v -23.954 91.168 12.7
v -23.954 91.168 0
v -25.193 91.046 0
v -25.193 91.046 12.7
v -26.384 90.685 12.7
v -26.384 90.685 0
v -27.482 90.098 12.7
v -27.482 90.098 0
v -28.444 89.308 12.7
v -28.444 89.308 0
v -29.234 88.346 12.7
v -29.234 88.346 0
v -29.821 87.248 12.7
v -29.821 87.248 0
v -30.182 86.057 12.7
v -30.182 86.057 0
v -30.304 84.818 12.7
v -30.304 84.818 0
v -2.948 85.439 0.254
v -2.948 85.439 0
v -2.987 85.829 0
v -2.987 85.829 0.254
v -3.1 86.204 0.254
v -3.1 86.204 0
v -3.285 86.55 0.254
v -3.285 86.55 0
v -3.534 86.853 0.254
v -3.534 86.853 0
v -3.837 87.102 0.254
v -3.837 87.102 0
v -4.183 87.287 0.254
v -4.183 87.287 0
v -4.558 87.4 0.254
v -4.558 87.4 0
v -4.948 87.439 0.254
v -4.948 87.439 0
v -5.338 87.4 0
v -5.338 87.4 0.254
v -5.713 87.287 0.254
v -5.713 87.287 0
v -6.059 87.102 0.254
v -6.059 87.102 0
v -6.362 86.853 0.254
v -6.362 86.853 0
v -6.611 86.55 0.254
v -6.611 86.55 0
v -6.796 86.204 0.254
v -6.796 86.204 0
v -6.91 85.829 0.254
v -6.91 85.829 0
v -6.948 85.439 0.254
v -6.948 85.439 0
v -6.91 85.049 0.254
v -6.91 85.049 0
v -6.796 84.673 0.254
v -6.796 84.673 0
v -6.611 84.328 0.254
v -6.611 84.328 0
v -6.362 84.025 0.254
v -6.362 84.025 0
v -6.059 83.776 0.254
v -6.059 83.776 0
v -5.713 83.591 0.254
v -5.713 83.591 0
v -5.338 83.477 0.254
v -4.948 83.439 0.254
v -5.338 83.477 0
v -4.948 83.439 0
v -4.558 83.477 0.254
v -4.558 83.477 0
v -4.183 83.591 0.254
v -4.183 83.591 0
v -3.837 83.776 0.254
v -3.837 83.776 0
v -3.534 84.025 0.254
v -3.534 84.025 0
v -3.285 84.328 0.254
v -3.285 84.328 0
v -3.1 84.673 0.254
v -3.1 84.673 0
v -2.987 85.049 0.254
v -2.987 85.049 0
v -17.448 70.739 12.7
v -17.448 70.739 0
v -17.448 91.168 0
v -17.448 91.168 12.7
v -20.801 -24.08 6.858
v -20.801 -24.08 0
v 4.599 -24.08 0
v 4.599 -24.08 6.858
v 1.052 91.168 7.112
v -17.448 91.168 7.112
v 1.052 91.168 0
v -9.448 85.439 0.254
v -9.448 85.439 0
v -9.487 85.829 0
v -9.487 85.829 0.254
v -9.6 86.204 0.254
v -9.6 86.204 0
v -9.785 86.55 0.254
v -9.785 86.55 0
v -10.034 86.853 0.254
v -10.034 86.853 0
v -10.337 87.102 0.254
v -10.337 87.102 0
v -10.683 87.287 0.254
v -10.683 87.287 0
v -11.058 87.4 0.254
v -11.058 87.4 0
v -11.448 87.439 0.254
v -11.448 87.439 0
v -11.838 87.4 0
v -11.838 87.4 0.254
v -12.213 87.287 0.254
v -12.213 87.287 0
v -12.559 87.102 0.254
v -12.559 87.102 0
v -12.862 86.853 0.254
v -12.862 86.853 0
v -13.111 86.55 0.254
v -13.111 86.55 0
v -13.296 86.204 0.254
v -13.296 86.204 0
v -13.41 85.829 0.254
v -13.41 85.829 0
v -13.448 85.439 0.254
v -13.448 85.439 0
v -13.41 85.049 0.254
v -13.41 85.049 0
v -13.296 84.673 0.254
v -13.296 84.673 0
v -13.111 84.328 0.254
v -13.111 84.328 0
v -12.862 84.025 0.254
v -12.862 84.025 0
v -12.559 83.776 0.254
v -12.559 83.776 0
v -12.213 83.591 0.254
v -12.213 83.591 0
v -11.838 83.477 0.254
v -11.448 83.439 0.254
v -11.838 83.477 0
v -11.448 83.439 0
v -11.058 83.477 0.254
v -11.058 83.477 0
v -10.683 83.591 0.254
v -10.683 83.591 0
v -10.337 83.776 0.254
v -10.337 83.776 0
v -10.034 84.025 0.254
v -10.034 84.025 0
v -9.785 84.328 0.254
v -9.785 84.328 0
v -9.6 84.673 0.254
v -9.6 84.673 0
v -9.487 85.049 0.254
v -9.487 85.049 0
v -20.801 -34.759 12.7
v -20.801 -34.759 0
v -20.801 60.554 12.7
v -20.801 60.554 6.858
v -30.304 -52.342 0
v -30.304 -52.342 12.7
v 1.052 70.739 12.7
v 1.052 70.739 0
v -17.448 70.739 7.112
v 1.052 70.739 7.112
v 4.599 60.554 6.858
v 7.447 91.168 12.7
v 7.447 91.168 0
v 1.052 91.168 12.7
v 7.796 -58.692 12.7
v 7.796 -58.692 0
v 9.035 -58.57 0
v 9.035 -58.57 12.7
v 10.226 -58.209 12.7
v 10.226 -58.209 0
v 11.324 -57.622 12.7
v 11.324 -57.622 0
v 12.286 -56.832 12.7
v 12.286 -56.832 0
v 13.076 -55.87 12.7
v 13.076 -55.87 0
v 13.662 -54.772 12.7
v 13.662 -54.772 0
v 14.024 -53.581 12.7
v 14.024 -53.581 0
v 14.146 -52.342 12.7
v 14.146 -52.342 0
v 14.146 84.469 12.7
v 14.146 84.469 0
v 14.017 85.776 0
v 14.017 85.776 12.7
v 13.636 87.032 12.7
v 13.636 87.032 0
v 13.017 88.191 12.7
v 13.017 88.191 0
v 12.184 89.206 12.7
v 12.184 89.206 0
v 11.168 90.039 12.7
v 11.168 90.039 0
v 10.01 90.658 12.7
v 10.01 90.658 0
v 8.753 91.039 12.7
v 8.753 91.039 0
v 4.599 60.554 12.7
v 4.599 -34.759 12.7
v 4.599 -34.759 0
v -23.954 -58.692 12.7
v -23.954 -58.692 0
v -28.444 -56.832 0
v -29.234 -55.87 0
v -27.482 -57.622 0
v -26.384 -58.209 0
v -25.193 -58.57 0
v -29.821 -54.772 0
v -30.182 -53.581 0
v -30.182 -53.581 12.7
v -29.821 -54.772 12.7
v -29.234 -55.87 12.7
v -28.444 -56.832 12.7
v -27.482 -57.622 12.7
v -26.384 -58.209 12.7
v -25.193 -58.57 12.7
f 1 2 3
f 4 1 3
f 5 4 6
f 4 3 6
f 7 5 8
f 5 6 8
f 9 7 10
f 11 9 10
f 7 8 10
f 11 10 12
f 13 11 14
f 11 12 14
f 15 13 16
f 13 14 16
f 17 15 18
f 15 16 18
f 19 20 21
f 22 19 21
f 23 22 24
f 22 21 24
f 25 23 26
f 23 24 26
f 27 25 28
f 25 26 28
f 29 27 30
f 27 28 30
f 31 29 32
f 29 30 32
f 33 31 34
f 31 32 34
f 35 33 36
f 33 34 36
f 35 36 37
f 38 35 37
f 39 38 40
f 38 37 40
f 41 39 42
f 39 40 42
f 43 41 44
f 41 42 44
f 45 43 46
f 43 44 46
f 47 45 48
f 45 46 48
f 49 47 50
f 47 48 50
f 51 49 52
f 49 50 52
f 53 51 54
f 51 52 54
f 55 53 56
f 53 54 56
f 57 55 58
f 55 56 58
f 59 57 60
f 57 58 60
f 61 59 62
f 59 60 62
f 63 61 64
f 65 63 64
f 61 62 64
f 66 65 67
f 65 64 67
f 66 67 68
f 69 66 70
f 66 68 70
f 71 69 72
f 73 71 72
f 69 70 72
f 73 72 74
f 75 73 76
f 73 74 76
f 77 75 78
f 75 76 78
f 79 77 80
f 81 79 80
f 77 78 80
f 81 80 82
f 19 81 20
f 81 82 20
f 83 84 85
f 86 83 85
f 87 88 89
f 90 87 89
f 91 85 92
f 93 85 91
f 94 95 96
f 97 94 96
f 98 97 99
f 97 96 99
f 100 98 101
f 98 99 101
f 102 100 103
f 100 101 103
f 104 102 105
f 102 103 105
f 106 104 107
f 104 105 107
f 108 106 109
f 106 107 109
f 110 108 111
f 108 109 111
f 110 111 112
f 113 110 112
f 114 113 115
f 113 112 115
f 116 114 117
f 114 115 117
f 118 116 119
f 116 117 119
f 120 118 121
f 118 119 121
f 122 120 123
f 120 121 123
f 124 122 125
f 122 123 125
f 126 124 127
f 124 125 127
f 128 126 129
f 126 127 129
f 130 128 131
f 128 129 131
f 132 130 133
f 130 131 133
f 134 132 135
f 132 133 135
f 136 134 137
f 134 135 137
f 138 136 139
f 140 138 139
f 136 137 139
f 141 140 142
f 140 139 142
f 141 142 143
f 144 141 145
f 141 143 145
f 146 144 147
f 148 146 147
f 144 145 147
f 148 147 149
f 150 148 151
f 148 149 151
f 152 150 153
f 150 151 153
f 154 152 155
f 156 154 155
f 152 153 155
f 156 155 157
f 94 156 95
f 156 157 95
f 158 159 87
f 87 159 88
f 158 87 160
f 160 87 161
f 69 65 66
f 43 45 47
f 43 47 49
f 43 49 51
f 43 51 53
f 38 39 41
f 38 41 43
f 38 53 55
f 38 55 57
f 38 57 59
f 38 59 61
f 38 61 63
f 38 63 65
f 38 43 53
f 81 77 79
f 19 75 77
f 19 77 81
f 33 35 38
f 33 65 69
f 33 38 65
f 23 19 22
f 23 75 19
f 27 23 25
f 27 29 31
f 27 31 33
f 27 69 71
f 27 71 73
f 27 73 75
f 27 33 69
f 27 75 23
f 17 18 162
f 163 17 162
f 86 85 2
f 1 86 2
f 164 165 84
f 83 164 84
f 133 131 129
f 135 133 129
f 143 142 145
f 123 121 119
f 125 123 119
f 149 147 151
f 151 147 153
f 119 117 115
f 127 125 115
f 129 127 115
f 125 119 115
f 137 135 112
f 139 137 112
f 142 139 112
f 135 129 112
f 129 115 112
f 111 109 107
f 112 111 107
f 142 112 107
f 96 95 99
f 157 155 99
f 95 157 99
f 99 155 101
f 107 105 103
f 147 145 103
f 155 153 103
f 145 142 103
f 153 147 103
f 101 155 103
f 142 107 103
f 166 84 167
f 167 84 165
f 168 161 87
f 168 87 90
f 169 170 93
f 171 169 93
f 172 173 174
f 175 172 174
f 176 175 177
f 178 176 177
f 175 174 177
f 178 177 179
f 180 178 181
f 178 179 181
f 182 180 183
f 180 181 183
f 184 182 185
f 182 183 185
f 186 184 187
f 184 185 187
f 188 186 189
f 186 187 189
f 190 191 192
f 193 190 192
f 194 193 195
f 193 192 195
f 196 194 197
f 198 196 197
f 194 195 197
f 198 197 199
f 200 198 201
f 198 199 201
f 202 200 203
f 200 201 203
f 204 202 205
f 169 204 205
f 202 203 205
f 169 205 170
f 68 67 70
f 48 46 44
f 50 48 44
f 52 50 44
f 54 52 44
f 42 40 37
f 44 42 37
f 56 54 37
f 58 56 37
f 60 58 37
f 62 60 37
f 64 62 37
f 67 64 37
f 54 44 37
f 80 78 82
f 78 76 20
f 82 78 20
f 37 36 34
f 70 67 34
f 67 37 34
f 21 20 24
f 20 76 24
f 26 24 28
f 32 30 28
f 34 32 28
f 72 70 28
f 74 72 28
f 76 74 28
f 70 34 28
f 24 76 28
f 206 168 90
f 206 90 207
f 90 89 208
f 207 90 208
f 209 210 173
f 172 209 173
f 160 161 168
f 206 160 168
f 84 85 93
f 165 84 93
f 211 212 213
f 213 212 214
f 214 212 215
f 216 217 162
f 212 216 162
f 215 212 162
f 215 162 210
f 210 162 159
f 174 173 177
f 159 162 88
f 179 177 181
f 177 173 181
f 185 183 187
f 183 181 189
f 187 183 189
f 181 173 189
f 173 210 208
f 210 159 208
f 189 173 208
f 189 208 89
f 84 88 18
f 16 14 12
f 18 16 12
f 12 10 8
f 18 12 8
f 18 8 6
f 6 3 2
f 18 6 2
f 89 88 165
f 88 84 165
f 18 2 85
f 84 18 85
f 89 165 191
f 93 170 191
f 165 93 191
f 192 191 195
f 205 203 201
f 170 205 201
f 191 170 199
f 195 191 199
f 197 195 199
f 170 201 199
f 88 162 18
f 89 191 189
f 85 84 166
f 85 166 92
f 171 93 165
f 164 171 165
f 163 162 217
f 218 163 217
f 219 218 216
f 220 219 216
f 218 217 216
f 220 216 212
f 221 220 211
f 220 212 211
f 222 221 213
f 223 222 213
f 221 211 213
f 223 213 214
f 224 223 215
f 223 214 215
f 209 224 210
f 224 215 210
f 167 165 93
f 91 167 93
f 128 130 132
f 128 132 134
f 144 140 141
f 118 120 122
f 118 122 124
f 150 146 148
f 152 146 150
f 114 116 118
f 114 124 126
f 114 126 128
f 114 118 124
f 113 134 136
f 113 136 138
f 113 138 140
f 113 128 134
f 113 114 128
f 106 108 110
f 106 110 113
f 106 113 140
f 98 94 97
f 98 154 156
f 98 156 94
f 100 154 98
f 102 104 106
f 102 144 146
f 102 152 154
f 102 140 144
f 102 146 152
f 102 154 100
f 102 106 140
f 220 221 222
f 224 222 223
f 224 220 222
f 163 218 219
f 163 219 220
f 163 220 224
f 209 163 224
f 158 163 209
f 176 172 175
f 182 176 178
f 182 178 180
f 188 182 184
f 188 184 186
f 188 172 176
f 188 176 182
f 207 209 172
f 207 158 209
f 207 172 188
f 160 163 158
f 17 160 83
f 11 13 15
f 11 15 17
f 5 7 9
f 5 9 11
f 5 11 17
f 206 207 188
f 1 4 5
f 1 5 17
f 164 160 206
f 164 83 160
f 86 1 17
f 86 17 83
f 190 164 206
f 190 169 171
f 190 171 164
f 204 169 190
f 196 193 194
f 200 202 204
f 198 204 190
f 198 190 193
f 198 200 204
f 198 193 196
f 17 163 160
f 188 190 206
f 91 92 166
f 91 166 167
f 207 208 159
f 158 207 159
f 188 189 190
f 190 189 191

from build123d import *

# Parameters (mm, degrees)
F1_DEPTH = 12.7
F0_R     = 1.999996
F2_DEPTH = 0.254
F0_W     = 25.4
F0_H     = 84.6341010183
F3_DEPTH = 6.858
F0_W_2   = 18.49998408
F0_H_2   = 20.4291737289
F4_DEPTH = 7.112


with BuildPart() as f1:
    # F0 (on Top) → F1 (new body)
    with BuildSketch(Plane.XY):
        with BuildLine():
            Line((-17.4480918804, 91.1680103695), (-23.9541744344, 91.1680103695))
            ThreePointArc((-23.9541744344, 91.1680103695), (-28.4443024949, 89.3081384301), (-30.3041744344, 84.8180103695))
            Line((-30.3041744344, 84.8180103695), (-30.3041744344, -52.3419896305))
            ThreePointArc((-30.3041744344, -52.3419896305), (-28.4443024949, -56.832117691), (-23.9541744344, -58.6919896305))
            Line((-23.9541744344, -58.6919896305), (7.7958255656, -58.6919896305))
            ThreePointArc((7.7958255656, -58.6919896305), (12.2859536261, -56.832117691), (14.1458255656, -52.3419896305))
            Line((14.1458255656, -52.3419896305), (14.1458255656, 84.4687083243))
            ThreePointArc((14.1458255656, 84.4687083243), (12.1836454258, 89.2058302297), (7.4465235204, 91.1680103695))
            Line((7.4465235204, 91.1680103695), (1.0518921996, 91.1680103695))
            Line((1.0518921996, 91.1680103695), (1.0518921996, 70.7388366406))
            Line((1.0518921996, 70.7388366406), (-17.4480918804, 70.7388366406))
            Line((-17.4480918804, 70.7388366406), (-17.4480918804, 91.1680103695))
        make_face()
        Polygon((4.5991841048, -34.7585864365), (-20.8008158952, -34.7585864365), (-20.8008158952, -24.0799579769), (-20.8008158952, 60.5541430414), (4.5991841048, 60.5541430414), (4.5991841048, -24.0799579769), align=None, mode=Mode.SUBTRACT)
    extrude(amount=F1_DEPTH)

    # F0 (on Top) → F3 (join)
    with BuildSketch(Plane.XY):
        with Locations((-8.1008158952, 18.2370925322)):
            Rectangle(F0_W, F0_H)
    extrude(amount=F3_DEPTH)


with BuildPart() as f2:
    # F0 (on Top) → F2 (new body)
    with BuildSketch(Plane.XY):
        with Locations((-4.9481038004, 85.4388326406)):
            Circle(F0_R)
    extrude(amount=F2_DEPTH)


with BuildPart() as f2b:
    # F0 (on Top) → F2, piece 2 (new body)
    with BuildSketch(Plane.XY):
        with Locations((-11.4480958804, 85.4388326406)):
            Circle(F0_R)
    extrude(amount=F2_DEPTH)


with BuildPart() as f4:
    # F0 (on Top) → F4 (new body)
    with BuildSketch(Plane.XY):
        with Locations((-8.1980998404, 80.9534235051)):
            Rectangle(F0_W_2, F0_H_2)
        with Locations((-11.4480958804, 85.4388326406)):
            Circle(F0_R, mode=Mode.SUBTRACT)
        with Locations((-4.9481038004, 85.4388326406)):
            Circle(F0_R, mode=Mode.SUBTRACT)
        with Locations((-11.4480958804, 85.4388326406)):
            Circle(F0_R)
        with Locations((-4.9481038004, 85.4388326406)):
            Circle(F0_R)
    extrude(amount=F4_DEPTH)


solid = Compound([f1.part, f2.part, f2b.part, f4.part])
